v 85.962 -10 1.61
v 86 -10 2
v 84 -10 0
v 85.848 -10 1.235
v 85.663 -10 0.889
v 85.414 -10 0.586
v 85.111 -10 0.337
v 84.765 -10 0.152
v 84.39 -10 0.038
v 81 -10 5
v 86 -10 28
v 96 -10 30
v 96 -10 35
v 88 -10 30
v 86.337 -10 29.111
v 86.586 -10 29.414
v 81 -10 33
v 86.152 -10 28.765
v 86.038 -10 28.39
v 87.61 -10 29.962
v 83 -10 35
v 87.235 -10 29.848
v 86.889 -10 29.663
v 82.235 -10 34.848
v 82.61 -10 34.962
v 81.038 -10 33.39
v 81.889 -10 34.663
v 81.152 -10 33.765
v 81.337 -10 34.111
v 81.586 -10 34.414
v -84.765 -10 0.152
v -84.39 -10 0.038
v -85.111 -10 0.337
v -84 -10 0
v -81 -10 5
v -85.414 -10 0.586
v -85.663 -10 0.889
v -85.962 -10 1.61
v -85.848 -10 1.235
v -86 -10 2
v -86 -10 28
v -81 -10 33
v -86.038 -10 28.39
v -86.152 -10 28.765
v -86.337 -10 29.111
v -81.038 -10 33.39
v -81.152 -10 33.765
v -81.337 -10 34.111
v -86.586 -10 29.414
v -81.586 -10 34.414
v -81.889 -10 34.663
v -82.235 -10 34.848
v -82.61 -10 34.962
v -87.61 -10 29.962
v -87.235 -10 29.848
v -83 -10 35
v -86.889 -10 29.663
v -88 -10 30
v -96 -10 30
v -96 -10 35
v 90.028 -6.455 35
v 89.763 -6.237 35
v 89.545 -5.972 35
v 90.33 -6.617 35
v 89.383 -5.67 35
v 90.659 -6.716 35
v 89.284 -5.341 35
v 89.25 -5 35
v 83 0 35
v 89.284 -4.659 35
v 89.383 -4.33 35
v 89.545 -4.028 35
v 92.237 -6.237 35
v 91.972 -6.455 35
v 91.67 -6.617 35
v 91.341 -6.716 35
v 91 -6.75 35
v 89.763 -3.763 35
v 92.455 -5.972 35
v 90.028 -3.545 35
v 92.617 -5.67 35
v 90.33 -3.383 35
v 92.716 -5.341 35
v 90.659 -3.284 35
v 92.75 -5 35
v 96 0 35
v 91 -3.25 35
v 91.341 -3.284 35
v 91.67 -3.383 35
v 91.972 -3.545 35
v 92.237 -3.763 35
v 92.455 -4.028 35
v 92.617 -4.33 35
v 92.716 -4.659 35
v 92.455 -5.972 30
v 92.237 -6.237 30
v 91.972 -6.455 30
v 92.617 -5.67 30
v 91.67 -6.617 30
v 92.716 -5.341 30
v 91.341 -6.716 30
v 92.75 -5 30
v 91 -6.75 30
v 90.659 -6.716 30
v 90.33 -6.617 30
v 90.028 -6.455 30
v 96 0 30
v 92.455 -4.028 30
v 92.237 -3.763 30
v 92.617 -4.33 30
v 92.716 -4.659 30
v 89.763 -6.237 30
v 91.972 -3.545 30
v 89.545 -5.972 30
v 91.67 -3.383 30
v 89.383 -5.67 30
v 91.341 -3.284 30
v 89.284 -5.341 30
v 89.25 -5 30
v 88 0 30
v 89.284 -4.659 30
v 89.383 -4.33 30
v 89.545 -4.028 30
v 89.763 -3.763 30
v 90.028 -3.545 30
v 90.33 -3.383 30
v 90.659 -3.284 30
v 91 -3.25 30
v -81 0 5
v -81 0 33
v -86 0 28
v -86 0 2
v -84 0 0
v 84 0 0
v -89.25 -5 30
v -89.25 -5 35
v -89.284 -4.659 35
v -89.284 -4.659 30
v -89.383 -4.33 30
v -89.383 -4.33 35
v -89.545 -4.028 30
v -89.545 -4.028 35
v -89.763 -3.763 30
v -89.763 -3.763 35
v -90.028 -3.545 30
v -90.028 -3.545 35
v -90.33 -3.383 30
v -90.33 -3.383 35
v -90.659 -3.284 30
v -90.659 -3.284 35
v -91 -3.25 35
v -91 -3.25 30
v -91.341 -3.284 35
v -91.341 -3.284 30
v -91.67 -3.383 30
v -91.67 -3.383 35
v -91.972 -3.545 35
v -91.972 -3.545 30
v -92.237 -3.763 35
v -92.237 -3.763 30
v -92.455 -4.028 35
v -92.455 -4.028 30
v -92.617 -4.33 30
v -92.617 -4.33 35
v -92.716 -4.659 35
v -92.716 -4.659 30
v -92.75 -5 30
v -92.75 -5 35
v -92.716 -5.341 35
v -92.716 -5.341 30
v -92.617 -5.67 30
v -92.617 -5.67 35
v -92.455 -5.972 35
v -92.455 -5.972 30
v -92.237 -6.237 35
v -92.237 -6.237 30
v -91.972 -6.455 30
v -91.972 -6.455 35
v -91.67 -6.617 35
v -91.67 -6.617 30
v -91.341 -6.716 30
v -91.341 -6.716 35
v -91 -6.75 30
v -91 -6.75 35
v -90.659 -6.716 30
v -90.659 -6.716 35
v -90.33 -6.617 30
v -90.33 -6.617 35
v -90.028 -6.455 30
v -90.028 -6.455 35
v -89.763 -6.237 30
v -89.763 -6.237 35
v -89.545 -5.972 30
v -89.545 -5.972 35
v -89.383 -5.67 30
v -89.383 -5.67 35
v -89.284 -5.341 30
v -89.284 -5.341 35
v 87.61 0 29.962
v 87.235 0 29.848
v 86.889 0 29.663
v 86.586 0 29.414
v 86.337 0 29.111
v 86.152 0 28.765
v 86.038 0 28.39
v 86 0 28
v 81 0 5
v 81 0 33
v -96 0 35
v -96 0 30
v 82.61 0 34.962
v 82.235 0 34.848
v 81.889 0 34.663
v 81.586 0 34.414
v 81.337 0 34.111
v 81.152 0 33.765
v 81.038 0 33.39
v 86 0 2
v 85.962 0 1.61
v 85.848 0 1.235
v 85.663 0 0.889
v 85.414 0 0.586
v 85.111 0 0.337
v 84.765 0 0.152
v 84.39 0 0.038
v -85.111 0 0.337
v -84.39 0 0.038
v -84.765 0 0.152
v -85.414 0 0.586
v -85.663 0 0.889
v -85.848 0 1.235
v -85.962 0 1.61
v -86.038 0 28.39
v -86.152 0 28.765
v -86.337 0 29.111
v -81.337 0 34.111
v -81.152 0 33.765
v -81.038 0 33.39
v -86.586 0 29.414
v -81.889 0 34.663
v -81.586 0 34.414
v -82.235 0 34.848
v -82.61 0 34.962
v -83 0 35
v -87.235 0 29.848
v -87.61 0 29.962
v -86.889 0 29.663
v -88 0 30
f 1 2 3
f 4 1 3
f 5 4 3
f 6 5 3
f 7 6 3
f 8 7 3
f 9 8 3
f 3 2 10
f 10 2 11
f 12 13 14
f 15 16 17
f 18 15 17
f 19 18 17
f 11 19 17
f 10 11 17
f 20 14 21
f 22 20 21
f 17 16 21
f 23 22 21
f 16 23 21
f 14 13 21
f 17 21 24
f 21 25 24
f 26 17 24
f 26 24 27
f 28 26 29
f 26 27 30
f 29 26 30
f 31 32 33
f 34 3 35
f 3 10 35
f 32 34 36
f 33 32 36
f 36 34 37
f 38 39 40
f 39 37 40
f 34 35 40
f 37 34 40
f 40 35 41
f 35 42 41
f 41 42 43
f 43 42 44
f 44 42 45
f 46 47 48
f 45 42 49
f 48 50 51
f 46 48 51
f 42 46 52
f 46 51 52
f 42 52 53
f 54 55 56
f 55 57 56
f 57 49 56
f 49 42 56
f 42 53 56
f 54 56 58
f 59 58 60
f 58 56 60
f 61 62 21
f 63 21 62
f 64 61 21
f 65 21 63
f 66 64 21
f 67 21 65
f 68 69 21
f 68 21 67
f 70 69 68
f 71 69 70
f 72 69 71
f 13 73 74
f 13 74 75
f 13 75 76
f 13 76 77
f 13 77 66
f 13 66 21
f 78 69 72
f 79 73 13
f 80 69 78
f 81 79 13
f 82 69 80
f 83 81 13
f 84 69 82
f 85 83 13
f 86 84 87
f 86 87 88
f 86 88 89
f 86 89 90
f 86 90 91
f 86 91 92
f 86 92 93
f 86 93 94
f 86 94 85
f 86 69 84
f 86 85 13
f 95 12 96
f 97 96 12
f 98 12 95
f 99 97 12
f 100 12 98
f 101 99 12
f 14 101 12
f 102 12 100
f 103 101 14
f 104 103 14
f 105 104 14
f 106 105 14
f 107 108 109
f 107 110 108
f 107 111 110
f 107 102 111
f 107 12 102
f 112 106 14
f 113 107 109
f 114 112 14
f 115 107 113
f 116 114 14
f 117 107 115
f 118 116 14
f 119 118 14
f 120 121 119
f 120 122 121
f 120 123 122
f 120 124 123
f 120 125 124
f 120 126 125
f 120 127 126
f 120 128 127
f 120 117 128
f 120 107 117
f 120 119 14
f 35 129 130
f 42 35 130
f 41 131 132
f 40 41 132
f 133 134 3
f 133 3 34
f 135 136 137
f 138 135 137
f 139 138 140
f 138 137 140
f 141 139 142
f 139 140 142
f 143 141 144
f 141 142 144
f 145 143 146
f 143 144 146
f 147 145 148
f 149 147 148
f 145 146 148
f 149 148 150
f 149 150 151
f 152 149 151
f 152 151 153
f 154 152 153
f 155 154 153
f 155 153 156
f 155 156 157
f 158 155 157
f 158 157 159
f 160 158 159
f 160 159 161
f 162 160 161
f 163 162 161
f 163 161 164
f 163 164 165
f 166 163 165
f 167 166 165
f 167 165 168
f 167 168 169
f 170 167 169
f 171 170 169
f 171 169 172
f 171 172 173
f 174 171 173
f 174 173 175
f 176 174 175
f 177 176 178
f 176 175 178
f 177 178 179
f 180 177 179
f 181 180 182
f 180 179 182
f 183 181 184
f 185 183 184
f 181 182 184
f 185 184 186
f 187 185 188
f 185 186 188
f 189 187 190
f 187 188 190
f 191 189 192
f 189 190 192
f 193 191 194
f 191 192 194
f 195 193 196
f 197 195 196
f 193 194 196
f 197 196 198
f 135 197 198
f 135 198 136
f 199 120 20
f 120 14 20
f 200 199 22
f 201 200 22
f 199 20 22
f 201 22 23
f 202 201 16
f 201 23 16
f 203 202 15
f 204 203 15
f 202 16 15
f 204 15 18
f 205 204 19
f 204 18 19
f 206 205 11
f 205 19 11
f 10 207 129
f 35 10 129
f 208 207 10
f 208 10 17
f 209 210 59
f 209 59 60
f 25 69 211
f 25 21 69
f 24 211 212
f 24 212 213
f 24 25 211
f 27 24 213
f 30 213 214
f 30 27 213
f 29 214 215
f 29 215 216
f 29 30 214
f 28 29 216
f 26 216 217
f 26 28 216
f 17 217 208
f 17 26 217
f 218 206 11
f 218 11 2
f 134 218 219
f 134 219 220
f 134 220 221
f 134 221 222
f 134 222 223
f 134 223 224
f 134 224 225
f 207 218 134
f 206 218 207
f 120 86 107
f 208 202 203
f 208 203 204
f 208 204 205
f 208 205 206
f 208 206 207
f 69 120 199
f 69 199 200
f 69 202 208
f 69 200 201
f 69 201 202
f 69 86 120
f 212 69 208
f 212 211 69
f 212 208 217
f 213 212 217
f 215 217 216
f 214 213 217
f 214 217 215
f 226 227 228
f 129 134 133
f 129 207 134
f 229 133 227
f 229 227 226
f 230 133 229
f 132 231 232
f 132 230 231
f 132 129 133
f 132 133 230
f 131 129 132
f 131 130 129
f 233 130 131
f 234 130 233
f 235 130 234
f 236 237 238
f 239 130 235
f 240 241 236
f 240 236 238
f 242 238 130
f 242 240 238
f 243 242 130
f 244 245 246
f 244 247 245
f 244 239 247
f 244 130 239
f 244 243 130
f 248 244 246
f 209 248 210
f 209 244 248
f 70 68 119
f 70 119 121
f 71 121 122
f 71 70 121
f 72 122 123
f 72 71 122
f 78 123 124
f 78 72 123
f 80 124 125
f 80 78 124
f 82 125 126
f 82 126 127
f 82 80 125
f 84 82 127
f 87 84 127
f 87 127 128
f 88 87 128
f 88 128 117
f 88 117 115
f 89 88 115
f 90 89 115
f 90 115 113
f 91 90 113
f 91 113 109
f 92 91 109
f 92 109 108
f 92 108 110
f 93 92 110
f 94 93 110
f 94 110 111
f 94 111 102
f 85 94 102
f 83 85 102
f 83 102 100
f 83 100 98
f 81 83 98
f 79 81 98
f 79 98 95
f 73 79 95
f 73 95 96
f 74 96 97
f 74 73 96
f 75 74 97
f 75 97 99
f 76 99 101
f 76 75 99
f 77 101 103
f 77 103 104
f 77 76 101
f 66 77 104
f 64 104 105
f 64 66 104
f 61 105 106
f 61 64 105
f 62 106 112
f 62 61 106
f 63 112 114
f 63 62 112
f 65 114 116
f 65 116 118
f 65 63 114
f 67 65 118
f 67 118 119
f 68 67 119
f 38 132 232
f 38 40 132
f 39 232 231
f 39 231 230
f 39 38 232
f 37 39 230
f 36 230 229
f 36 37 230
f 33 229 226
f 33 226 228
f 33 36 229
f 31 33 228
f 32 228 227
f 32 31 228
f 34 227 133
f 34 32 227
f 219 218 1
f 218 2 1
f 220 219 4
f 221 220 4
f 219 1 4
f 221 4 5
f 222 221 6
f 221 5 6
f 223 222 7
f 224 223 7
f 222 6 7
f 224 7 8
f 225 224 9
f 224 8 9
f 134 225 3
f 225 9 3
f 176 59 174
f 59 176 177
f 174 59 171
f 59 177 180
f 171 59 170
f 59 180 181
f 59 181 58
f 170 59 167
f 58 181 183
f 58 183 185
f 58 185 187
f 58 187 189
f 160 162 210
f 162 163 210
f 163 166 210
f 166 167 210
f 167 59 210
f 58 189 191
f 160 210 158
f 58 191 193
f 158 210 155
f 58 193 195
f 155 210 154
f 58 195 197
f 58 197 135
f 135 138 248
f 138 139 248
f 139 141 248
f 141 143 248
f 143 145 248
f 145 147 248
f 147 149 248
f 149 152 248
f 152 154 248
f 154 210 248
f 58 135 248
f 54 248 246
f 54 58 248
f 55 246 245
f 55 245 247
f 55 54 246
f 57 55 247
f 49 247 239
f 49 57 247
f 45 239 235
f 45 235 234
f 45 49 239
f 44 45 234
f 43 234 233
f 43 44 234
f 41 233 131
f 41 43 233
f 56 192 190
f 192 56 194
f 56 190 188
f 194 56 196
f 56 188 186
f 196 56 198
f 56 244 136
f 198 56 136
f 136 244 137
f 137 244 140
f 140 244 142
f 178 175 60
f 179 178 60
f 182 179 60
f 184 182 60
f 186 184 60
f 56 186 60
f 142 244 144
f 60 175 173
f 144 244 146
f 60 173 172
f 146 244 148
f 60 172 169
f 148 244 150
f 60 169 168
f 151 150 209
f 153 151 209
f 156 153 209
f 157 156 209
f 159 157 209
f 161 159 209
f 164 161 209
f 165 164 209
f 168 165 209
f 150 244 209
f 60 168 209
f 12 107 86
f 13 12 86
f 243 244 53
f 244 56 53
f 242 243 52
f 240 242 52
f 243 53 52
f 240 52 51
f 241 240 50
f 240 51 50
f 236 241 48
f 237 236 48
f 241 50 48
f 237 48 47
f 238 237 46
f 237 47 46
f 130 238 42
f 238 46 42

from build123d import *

# Parameters (mm, degrees)
F0_W     = 10
F0_H     = 5
F0_W_2   = 81
F1_DEPTH = 10
F2_R     = 1.75
F3_DEPTH = 35.001
F4_R     = 2


with BuildPart() as f1:
    # F0 (on Front) → F1 (new body)
    with BuildSketch(Plane.XZ):
        with Locations((-91, 32.5)):
            Rectangle(F0_W, F0_H)
        Polygon((-86, 0), (-81, 0), (-81, 5), (-81, 35), (-86, 35), (-86, 30), align=None)
        with Locations((-40.5, 2.5)):
            Rectangle(F0_W_2, F0_H)
    extrude(amount=F1_DEPTH)

    # F2 (on face) → F3 (cut, through all)
    with BuildSketch(Plane.XY.offset(35)):
        with Locations((-91, -5)):
            Circle(F2_R)
    extrude(amount=-F3_DEPTH, mode=Mode.SUBTRACT)

    # F4
    f4_edges = [f1.edges().sort_by_distance(p)[0] for p in [
        (-81, -5, 35),
        (-86, -5, 30),
        (-86, -5, 0),
    ]]
    fillet(f4_edges, radius=F4_R)

    # F5: F1 across plane


with BuildPart() as f1_1:
    add(f1.part)
    add(f1.part.mirror(Plane.YZ))


solid = f1_1.part
